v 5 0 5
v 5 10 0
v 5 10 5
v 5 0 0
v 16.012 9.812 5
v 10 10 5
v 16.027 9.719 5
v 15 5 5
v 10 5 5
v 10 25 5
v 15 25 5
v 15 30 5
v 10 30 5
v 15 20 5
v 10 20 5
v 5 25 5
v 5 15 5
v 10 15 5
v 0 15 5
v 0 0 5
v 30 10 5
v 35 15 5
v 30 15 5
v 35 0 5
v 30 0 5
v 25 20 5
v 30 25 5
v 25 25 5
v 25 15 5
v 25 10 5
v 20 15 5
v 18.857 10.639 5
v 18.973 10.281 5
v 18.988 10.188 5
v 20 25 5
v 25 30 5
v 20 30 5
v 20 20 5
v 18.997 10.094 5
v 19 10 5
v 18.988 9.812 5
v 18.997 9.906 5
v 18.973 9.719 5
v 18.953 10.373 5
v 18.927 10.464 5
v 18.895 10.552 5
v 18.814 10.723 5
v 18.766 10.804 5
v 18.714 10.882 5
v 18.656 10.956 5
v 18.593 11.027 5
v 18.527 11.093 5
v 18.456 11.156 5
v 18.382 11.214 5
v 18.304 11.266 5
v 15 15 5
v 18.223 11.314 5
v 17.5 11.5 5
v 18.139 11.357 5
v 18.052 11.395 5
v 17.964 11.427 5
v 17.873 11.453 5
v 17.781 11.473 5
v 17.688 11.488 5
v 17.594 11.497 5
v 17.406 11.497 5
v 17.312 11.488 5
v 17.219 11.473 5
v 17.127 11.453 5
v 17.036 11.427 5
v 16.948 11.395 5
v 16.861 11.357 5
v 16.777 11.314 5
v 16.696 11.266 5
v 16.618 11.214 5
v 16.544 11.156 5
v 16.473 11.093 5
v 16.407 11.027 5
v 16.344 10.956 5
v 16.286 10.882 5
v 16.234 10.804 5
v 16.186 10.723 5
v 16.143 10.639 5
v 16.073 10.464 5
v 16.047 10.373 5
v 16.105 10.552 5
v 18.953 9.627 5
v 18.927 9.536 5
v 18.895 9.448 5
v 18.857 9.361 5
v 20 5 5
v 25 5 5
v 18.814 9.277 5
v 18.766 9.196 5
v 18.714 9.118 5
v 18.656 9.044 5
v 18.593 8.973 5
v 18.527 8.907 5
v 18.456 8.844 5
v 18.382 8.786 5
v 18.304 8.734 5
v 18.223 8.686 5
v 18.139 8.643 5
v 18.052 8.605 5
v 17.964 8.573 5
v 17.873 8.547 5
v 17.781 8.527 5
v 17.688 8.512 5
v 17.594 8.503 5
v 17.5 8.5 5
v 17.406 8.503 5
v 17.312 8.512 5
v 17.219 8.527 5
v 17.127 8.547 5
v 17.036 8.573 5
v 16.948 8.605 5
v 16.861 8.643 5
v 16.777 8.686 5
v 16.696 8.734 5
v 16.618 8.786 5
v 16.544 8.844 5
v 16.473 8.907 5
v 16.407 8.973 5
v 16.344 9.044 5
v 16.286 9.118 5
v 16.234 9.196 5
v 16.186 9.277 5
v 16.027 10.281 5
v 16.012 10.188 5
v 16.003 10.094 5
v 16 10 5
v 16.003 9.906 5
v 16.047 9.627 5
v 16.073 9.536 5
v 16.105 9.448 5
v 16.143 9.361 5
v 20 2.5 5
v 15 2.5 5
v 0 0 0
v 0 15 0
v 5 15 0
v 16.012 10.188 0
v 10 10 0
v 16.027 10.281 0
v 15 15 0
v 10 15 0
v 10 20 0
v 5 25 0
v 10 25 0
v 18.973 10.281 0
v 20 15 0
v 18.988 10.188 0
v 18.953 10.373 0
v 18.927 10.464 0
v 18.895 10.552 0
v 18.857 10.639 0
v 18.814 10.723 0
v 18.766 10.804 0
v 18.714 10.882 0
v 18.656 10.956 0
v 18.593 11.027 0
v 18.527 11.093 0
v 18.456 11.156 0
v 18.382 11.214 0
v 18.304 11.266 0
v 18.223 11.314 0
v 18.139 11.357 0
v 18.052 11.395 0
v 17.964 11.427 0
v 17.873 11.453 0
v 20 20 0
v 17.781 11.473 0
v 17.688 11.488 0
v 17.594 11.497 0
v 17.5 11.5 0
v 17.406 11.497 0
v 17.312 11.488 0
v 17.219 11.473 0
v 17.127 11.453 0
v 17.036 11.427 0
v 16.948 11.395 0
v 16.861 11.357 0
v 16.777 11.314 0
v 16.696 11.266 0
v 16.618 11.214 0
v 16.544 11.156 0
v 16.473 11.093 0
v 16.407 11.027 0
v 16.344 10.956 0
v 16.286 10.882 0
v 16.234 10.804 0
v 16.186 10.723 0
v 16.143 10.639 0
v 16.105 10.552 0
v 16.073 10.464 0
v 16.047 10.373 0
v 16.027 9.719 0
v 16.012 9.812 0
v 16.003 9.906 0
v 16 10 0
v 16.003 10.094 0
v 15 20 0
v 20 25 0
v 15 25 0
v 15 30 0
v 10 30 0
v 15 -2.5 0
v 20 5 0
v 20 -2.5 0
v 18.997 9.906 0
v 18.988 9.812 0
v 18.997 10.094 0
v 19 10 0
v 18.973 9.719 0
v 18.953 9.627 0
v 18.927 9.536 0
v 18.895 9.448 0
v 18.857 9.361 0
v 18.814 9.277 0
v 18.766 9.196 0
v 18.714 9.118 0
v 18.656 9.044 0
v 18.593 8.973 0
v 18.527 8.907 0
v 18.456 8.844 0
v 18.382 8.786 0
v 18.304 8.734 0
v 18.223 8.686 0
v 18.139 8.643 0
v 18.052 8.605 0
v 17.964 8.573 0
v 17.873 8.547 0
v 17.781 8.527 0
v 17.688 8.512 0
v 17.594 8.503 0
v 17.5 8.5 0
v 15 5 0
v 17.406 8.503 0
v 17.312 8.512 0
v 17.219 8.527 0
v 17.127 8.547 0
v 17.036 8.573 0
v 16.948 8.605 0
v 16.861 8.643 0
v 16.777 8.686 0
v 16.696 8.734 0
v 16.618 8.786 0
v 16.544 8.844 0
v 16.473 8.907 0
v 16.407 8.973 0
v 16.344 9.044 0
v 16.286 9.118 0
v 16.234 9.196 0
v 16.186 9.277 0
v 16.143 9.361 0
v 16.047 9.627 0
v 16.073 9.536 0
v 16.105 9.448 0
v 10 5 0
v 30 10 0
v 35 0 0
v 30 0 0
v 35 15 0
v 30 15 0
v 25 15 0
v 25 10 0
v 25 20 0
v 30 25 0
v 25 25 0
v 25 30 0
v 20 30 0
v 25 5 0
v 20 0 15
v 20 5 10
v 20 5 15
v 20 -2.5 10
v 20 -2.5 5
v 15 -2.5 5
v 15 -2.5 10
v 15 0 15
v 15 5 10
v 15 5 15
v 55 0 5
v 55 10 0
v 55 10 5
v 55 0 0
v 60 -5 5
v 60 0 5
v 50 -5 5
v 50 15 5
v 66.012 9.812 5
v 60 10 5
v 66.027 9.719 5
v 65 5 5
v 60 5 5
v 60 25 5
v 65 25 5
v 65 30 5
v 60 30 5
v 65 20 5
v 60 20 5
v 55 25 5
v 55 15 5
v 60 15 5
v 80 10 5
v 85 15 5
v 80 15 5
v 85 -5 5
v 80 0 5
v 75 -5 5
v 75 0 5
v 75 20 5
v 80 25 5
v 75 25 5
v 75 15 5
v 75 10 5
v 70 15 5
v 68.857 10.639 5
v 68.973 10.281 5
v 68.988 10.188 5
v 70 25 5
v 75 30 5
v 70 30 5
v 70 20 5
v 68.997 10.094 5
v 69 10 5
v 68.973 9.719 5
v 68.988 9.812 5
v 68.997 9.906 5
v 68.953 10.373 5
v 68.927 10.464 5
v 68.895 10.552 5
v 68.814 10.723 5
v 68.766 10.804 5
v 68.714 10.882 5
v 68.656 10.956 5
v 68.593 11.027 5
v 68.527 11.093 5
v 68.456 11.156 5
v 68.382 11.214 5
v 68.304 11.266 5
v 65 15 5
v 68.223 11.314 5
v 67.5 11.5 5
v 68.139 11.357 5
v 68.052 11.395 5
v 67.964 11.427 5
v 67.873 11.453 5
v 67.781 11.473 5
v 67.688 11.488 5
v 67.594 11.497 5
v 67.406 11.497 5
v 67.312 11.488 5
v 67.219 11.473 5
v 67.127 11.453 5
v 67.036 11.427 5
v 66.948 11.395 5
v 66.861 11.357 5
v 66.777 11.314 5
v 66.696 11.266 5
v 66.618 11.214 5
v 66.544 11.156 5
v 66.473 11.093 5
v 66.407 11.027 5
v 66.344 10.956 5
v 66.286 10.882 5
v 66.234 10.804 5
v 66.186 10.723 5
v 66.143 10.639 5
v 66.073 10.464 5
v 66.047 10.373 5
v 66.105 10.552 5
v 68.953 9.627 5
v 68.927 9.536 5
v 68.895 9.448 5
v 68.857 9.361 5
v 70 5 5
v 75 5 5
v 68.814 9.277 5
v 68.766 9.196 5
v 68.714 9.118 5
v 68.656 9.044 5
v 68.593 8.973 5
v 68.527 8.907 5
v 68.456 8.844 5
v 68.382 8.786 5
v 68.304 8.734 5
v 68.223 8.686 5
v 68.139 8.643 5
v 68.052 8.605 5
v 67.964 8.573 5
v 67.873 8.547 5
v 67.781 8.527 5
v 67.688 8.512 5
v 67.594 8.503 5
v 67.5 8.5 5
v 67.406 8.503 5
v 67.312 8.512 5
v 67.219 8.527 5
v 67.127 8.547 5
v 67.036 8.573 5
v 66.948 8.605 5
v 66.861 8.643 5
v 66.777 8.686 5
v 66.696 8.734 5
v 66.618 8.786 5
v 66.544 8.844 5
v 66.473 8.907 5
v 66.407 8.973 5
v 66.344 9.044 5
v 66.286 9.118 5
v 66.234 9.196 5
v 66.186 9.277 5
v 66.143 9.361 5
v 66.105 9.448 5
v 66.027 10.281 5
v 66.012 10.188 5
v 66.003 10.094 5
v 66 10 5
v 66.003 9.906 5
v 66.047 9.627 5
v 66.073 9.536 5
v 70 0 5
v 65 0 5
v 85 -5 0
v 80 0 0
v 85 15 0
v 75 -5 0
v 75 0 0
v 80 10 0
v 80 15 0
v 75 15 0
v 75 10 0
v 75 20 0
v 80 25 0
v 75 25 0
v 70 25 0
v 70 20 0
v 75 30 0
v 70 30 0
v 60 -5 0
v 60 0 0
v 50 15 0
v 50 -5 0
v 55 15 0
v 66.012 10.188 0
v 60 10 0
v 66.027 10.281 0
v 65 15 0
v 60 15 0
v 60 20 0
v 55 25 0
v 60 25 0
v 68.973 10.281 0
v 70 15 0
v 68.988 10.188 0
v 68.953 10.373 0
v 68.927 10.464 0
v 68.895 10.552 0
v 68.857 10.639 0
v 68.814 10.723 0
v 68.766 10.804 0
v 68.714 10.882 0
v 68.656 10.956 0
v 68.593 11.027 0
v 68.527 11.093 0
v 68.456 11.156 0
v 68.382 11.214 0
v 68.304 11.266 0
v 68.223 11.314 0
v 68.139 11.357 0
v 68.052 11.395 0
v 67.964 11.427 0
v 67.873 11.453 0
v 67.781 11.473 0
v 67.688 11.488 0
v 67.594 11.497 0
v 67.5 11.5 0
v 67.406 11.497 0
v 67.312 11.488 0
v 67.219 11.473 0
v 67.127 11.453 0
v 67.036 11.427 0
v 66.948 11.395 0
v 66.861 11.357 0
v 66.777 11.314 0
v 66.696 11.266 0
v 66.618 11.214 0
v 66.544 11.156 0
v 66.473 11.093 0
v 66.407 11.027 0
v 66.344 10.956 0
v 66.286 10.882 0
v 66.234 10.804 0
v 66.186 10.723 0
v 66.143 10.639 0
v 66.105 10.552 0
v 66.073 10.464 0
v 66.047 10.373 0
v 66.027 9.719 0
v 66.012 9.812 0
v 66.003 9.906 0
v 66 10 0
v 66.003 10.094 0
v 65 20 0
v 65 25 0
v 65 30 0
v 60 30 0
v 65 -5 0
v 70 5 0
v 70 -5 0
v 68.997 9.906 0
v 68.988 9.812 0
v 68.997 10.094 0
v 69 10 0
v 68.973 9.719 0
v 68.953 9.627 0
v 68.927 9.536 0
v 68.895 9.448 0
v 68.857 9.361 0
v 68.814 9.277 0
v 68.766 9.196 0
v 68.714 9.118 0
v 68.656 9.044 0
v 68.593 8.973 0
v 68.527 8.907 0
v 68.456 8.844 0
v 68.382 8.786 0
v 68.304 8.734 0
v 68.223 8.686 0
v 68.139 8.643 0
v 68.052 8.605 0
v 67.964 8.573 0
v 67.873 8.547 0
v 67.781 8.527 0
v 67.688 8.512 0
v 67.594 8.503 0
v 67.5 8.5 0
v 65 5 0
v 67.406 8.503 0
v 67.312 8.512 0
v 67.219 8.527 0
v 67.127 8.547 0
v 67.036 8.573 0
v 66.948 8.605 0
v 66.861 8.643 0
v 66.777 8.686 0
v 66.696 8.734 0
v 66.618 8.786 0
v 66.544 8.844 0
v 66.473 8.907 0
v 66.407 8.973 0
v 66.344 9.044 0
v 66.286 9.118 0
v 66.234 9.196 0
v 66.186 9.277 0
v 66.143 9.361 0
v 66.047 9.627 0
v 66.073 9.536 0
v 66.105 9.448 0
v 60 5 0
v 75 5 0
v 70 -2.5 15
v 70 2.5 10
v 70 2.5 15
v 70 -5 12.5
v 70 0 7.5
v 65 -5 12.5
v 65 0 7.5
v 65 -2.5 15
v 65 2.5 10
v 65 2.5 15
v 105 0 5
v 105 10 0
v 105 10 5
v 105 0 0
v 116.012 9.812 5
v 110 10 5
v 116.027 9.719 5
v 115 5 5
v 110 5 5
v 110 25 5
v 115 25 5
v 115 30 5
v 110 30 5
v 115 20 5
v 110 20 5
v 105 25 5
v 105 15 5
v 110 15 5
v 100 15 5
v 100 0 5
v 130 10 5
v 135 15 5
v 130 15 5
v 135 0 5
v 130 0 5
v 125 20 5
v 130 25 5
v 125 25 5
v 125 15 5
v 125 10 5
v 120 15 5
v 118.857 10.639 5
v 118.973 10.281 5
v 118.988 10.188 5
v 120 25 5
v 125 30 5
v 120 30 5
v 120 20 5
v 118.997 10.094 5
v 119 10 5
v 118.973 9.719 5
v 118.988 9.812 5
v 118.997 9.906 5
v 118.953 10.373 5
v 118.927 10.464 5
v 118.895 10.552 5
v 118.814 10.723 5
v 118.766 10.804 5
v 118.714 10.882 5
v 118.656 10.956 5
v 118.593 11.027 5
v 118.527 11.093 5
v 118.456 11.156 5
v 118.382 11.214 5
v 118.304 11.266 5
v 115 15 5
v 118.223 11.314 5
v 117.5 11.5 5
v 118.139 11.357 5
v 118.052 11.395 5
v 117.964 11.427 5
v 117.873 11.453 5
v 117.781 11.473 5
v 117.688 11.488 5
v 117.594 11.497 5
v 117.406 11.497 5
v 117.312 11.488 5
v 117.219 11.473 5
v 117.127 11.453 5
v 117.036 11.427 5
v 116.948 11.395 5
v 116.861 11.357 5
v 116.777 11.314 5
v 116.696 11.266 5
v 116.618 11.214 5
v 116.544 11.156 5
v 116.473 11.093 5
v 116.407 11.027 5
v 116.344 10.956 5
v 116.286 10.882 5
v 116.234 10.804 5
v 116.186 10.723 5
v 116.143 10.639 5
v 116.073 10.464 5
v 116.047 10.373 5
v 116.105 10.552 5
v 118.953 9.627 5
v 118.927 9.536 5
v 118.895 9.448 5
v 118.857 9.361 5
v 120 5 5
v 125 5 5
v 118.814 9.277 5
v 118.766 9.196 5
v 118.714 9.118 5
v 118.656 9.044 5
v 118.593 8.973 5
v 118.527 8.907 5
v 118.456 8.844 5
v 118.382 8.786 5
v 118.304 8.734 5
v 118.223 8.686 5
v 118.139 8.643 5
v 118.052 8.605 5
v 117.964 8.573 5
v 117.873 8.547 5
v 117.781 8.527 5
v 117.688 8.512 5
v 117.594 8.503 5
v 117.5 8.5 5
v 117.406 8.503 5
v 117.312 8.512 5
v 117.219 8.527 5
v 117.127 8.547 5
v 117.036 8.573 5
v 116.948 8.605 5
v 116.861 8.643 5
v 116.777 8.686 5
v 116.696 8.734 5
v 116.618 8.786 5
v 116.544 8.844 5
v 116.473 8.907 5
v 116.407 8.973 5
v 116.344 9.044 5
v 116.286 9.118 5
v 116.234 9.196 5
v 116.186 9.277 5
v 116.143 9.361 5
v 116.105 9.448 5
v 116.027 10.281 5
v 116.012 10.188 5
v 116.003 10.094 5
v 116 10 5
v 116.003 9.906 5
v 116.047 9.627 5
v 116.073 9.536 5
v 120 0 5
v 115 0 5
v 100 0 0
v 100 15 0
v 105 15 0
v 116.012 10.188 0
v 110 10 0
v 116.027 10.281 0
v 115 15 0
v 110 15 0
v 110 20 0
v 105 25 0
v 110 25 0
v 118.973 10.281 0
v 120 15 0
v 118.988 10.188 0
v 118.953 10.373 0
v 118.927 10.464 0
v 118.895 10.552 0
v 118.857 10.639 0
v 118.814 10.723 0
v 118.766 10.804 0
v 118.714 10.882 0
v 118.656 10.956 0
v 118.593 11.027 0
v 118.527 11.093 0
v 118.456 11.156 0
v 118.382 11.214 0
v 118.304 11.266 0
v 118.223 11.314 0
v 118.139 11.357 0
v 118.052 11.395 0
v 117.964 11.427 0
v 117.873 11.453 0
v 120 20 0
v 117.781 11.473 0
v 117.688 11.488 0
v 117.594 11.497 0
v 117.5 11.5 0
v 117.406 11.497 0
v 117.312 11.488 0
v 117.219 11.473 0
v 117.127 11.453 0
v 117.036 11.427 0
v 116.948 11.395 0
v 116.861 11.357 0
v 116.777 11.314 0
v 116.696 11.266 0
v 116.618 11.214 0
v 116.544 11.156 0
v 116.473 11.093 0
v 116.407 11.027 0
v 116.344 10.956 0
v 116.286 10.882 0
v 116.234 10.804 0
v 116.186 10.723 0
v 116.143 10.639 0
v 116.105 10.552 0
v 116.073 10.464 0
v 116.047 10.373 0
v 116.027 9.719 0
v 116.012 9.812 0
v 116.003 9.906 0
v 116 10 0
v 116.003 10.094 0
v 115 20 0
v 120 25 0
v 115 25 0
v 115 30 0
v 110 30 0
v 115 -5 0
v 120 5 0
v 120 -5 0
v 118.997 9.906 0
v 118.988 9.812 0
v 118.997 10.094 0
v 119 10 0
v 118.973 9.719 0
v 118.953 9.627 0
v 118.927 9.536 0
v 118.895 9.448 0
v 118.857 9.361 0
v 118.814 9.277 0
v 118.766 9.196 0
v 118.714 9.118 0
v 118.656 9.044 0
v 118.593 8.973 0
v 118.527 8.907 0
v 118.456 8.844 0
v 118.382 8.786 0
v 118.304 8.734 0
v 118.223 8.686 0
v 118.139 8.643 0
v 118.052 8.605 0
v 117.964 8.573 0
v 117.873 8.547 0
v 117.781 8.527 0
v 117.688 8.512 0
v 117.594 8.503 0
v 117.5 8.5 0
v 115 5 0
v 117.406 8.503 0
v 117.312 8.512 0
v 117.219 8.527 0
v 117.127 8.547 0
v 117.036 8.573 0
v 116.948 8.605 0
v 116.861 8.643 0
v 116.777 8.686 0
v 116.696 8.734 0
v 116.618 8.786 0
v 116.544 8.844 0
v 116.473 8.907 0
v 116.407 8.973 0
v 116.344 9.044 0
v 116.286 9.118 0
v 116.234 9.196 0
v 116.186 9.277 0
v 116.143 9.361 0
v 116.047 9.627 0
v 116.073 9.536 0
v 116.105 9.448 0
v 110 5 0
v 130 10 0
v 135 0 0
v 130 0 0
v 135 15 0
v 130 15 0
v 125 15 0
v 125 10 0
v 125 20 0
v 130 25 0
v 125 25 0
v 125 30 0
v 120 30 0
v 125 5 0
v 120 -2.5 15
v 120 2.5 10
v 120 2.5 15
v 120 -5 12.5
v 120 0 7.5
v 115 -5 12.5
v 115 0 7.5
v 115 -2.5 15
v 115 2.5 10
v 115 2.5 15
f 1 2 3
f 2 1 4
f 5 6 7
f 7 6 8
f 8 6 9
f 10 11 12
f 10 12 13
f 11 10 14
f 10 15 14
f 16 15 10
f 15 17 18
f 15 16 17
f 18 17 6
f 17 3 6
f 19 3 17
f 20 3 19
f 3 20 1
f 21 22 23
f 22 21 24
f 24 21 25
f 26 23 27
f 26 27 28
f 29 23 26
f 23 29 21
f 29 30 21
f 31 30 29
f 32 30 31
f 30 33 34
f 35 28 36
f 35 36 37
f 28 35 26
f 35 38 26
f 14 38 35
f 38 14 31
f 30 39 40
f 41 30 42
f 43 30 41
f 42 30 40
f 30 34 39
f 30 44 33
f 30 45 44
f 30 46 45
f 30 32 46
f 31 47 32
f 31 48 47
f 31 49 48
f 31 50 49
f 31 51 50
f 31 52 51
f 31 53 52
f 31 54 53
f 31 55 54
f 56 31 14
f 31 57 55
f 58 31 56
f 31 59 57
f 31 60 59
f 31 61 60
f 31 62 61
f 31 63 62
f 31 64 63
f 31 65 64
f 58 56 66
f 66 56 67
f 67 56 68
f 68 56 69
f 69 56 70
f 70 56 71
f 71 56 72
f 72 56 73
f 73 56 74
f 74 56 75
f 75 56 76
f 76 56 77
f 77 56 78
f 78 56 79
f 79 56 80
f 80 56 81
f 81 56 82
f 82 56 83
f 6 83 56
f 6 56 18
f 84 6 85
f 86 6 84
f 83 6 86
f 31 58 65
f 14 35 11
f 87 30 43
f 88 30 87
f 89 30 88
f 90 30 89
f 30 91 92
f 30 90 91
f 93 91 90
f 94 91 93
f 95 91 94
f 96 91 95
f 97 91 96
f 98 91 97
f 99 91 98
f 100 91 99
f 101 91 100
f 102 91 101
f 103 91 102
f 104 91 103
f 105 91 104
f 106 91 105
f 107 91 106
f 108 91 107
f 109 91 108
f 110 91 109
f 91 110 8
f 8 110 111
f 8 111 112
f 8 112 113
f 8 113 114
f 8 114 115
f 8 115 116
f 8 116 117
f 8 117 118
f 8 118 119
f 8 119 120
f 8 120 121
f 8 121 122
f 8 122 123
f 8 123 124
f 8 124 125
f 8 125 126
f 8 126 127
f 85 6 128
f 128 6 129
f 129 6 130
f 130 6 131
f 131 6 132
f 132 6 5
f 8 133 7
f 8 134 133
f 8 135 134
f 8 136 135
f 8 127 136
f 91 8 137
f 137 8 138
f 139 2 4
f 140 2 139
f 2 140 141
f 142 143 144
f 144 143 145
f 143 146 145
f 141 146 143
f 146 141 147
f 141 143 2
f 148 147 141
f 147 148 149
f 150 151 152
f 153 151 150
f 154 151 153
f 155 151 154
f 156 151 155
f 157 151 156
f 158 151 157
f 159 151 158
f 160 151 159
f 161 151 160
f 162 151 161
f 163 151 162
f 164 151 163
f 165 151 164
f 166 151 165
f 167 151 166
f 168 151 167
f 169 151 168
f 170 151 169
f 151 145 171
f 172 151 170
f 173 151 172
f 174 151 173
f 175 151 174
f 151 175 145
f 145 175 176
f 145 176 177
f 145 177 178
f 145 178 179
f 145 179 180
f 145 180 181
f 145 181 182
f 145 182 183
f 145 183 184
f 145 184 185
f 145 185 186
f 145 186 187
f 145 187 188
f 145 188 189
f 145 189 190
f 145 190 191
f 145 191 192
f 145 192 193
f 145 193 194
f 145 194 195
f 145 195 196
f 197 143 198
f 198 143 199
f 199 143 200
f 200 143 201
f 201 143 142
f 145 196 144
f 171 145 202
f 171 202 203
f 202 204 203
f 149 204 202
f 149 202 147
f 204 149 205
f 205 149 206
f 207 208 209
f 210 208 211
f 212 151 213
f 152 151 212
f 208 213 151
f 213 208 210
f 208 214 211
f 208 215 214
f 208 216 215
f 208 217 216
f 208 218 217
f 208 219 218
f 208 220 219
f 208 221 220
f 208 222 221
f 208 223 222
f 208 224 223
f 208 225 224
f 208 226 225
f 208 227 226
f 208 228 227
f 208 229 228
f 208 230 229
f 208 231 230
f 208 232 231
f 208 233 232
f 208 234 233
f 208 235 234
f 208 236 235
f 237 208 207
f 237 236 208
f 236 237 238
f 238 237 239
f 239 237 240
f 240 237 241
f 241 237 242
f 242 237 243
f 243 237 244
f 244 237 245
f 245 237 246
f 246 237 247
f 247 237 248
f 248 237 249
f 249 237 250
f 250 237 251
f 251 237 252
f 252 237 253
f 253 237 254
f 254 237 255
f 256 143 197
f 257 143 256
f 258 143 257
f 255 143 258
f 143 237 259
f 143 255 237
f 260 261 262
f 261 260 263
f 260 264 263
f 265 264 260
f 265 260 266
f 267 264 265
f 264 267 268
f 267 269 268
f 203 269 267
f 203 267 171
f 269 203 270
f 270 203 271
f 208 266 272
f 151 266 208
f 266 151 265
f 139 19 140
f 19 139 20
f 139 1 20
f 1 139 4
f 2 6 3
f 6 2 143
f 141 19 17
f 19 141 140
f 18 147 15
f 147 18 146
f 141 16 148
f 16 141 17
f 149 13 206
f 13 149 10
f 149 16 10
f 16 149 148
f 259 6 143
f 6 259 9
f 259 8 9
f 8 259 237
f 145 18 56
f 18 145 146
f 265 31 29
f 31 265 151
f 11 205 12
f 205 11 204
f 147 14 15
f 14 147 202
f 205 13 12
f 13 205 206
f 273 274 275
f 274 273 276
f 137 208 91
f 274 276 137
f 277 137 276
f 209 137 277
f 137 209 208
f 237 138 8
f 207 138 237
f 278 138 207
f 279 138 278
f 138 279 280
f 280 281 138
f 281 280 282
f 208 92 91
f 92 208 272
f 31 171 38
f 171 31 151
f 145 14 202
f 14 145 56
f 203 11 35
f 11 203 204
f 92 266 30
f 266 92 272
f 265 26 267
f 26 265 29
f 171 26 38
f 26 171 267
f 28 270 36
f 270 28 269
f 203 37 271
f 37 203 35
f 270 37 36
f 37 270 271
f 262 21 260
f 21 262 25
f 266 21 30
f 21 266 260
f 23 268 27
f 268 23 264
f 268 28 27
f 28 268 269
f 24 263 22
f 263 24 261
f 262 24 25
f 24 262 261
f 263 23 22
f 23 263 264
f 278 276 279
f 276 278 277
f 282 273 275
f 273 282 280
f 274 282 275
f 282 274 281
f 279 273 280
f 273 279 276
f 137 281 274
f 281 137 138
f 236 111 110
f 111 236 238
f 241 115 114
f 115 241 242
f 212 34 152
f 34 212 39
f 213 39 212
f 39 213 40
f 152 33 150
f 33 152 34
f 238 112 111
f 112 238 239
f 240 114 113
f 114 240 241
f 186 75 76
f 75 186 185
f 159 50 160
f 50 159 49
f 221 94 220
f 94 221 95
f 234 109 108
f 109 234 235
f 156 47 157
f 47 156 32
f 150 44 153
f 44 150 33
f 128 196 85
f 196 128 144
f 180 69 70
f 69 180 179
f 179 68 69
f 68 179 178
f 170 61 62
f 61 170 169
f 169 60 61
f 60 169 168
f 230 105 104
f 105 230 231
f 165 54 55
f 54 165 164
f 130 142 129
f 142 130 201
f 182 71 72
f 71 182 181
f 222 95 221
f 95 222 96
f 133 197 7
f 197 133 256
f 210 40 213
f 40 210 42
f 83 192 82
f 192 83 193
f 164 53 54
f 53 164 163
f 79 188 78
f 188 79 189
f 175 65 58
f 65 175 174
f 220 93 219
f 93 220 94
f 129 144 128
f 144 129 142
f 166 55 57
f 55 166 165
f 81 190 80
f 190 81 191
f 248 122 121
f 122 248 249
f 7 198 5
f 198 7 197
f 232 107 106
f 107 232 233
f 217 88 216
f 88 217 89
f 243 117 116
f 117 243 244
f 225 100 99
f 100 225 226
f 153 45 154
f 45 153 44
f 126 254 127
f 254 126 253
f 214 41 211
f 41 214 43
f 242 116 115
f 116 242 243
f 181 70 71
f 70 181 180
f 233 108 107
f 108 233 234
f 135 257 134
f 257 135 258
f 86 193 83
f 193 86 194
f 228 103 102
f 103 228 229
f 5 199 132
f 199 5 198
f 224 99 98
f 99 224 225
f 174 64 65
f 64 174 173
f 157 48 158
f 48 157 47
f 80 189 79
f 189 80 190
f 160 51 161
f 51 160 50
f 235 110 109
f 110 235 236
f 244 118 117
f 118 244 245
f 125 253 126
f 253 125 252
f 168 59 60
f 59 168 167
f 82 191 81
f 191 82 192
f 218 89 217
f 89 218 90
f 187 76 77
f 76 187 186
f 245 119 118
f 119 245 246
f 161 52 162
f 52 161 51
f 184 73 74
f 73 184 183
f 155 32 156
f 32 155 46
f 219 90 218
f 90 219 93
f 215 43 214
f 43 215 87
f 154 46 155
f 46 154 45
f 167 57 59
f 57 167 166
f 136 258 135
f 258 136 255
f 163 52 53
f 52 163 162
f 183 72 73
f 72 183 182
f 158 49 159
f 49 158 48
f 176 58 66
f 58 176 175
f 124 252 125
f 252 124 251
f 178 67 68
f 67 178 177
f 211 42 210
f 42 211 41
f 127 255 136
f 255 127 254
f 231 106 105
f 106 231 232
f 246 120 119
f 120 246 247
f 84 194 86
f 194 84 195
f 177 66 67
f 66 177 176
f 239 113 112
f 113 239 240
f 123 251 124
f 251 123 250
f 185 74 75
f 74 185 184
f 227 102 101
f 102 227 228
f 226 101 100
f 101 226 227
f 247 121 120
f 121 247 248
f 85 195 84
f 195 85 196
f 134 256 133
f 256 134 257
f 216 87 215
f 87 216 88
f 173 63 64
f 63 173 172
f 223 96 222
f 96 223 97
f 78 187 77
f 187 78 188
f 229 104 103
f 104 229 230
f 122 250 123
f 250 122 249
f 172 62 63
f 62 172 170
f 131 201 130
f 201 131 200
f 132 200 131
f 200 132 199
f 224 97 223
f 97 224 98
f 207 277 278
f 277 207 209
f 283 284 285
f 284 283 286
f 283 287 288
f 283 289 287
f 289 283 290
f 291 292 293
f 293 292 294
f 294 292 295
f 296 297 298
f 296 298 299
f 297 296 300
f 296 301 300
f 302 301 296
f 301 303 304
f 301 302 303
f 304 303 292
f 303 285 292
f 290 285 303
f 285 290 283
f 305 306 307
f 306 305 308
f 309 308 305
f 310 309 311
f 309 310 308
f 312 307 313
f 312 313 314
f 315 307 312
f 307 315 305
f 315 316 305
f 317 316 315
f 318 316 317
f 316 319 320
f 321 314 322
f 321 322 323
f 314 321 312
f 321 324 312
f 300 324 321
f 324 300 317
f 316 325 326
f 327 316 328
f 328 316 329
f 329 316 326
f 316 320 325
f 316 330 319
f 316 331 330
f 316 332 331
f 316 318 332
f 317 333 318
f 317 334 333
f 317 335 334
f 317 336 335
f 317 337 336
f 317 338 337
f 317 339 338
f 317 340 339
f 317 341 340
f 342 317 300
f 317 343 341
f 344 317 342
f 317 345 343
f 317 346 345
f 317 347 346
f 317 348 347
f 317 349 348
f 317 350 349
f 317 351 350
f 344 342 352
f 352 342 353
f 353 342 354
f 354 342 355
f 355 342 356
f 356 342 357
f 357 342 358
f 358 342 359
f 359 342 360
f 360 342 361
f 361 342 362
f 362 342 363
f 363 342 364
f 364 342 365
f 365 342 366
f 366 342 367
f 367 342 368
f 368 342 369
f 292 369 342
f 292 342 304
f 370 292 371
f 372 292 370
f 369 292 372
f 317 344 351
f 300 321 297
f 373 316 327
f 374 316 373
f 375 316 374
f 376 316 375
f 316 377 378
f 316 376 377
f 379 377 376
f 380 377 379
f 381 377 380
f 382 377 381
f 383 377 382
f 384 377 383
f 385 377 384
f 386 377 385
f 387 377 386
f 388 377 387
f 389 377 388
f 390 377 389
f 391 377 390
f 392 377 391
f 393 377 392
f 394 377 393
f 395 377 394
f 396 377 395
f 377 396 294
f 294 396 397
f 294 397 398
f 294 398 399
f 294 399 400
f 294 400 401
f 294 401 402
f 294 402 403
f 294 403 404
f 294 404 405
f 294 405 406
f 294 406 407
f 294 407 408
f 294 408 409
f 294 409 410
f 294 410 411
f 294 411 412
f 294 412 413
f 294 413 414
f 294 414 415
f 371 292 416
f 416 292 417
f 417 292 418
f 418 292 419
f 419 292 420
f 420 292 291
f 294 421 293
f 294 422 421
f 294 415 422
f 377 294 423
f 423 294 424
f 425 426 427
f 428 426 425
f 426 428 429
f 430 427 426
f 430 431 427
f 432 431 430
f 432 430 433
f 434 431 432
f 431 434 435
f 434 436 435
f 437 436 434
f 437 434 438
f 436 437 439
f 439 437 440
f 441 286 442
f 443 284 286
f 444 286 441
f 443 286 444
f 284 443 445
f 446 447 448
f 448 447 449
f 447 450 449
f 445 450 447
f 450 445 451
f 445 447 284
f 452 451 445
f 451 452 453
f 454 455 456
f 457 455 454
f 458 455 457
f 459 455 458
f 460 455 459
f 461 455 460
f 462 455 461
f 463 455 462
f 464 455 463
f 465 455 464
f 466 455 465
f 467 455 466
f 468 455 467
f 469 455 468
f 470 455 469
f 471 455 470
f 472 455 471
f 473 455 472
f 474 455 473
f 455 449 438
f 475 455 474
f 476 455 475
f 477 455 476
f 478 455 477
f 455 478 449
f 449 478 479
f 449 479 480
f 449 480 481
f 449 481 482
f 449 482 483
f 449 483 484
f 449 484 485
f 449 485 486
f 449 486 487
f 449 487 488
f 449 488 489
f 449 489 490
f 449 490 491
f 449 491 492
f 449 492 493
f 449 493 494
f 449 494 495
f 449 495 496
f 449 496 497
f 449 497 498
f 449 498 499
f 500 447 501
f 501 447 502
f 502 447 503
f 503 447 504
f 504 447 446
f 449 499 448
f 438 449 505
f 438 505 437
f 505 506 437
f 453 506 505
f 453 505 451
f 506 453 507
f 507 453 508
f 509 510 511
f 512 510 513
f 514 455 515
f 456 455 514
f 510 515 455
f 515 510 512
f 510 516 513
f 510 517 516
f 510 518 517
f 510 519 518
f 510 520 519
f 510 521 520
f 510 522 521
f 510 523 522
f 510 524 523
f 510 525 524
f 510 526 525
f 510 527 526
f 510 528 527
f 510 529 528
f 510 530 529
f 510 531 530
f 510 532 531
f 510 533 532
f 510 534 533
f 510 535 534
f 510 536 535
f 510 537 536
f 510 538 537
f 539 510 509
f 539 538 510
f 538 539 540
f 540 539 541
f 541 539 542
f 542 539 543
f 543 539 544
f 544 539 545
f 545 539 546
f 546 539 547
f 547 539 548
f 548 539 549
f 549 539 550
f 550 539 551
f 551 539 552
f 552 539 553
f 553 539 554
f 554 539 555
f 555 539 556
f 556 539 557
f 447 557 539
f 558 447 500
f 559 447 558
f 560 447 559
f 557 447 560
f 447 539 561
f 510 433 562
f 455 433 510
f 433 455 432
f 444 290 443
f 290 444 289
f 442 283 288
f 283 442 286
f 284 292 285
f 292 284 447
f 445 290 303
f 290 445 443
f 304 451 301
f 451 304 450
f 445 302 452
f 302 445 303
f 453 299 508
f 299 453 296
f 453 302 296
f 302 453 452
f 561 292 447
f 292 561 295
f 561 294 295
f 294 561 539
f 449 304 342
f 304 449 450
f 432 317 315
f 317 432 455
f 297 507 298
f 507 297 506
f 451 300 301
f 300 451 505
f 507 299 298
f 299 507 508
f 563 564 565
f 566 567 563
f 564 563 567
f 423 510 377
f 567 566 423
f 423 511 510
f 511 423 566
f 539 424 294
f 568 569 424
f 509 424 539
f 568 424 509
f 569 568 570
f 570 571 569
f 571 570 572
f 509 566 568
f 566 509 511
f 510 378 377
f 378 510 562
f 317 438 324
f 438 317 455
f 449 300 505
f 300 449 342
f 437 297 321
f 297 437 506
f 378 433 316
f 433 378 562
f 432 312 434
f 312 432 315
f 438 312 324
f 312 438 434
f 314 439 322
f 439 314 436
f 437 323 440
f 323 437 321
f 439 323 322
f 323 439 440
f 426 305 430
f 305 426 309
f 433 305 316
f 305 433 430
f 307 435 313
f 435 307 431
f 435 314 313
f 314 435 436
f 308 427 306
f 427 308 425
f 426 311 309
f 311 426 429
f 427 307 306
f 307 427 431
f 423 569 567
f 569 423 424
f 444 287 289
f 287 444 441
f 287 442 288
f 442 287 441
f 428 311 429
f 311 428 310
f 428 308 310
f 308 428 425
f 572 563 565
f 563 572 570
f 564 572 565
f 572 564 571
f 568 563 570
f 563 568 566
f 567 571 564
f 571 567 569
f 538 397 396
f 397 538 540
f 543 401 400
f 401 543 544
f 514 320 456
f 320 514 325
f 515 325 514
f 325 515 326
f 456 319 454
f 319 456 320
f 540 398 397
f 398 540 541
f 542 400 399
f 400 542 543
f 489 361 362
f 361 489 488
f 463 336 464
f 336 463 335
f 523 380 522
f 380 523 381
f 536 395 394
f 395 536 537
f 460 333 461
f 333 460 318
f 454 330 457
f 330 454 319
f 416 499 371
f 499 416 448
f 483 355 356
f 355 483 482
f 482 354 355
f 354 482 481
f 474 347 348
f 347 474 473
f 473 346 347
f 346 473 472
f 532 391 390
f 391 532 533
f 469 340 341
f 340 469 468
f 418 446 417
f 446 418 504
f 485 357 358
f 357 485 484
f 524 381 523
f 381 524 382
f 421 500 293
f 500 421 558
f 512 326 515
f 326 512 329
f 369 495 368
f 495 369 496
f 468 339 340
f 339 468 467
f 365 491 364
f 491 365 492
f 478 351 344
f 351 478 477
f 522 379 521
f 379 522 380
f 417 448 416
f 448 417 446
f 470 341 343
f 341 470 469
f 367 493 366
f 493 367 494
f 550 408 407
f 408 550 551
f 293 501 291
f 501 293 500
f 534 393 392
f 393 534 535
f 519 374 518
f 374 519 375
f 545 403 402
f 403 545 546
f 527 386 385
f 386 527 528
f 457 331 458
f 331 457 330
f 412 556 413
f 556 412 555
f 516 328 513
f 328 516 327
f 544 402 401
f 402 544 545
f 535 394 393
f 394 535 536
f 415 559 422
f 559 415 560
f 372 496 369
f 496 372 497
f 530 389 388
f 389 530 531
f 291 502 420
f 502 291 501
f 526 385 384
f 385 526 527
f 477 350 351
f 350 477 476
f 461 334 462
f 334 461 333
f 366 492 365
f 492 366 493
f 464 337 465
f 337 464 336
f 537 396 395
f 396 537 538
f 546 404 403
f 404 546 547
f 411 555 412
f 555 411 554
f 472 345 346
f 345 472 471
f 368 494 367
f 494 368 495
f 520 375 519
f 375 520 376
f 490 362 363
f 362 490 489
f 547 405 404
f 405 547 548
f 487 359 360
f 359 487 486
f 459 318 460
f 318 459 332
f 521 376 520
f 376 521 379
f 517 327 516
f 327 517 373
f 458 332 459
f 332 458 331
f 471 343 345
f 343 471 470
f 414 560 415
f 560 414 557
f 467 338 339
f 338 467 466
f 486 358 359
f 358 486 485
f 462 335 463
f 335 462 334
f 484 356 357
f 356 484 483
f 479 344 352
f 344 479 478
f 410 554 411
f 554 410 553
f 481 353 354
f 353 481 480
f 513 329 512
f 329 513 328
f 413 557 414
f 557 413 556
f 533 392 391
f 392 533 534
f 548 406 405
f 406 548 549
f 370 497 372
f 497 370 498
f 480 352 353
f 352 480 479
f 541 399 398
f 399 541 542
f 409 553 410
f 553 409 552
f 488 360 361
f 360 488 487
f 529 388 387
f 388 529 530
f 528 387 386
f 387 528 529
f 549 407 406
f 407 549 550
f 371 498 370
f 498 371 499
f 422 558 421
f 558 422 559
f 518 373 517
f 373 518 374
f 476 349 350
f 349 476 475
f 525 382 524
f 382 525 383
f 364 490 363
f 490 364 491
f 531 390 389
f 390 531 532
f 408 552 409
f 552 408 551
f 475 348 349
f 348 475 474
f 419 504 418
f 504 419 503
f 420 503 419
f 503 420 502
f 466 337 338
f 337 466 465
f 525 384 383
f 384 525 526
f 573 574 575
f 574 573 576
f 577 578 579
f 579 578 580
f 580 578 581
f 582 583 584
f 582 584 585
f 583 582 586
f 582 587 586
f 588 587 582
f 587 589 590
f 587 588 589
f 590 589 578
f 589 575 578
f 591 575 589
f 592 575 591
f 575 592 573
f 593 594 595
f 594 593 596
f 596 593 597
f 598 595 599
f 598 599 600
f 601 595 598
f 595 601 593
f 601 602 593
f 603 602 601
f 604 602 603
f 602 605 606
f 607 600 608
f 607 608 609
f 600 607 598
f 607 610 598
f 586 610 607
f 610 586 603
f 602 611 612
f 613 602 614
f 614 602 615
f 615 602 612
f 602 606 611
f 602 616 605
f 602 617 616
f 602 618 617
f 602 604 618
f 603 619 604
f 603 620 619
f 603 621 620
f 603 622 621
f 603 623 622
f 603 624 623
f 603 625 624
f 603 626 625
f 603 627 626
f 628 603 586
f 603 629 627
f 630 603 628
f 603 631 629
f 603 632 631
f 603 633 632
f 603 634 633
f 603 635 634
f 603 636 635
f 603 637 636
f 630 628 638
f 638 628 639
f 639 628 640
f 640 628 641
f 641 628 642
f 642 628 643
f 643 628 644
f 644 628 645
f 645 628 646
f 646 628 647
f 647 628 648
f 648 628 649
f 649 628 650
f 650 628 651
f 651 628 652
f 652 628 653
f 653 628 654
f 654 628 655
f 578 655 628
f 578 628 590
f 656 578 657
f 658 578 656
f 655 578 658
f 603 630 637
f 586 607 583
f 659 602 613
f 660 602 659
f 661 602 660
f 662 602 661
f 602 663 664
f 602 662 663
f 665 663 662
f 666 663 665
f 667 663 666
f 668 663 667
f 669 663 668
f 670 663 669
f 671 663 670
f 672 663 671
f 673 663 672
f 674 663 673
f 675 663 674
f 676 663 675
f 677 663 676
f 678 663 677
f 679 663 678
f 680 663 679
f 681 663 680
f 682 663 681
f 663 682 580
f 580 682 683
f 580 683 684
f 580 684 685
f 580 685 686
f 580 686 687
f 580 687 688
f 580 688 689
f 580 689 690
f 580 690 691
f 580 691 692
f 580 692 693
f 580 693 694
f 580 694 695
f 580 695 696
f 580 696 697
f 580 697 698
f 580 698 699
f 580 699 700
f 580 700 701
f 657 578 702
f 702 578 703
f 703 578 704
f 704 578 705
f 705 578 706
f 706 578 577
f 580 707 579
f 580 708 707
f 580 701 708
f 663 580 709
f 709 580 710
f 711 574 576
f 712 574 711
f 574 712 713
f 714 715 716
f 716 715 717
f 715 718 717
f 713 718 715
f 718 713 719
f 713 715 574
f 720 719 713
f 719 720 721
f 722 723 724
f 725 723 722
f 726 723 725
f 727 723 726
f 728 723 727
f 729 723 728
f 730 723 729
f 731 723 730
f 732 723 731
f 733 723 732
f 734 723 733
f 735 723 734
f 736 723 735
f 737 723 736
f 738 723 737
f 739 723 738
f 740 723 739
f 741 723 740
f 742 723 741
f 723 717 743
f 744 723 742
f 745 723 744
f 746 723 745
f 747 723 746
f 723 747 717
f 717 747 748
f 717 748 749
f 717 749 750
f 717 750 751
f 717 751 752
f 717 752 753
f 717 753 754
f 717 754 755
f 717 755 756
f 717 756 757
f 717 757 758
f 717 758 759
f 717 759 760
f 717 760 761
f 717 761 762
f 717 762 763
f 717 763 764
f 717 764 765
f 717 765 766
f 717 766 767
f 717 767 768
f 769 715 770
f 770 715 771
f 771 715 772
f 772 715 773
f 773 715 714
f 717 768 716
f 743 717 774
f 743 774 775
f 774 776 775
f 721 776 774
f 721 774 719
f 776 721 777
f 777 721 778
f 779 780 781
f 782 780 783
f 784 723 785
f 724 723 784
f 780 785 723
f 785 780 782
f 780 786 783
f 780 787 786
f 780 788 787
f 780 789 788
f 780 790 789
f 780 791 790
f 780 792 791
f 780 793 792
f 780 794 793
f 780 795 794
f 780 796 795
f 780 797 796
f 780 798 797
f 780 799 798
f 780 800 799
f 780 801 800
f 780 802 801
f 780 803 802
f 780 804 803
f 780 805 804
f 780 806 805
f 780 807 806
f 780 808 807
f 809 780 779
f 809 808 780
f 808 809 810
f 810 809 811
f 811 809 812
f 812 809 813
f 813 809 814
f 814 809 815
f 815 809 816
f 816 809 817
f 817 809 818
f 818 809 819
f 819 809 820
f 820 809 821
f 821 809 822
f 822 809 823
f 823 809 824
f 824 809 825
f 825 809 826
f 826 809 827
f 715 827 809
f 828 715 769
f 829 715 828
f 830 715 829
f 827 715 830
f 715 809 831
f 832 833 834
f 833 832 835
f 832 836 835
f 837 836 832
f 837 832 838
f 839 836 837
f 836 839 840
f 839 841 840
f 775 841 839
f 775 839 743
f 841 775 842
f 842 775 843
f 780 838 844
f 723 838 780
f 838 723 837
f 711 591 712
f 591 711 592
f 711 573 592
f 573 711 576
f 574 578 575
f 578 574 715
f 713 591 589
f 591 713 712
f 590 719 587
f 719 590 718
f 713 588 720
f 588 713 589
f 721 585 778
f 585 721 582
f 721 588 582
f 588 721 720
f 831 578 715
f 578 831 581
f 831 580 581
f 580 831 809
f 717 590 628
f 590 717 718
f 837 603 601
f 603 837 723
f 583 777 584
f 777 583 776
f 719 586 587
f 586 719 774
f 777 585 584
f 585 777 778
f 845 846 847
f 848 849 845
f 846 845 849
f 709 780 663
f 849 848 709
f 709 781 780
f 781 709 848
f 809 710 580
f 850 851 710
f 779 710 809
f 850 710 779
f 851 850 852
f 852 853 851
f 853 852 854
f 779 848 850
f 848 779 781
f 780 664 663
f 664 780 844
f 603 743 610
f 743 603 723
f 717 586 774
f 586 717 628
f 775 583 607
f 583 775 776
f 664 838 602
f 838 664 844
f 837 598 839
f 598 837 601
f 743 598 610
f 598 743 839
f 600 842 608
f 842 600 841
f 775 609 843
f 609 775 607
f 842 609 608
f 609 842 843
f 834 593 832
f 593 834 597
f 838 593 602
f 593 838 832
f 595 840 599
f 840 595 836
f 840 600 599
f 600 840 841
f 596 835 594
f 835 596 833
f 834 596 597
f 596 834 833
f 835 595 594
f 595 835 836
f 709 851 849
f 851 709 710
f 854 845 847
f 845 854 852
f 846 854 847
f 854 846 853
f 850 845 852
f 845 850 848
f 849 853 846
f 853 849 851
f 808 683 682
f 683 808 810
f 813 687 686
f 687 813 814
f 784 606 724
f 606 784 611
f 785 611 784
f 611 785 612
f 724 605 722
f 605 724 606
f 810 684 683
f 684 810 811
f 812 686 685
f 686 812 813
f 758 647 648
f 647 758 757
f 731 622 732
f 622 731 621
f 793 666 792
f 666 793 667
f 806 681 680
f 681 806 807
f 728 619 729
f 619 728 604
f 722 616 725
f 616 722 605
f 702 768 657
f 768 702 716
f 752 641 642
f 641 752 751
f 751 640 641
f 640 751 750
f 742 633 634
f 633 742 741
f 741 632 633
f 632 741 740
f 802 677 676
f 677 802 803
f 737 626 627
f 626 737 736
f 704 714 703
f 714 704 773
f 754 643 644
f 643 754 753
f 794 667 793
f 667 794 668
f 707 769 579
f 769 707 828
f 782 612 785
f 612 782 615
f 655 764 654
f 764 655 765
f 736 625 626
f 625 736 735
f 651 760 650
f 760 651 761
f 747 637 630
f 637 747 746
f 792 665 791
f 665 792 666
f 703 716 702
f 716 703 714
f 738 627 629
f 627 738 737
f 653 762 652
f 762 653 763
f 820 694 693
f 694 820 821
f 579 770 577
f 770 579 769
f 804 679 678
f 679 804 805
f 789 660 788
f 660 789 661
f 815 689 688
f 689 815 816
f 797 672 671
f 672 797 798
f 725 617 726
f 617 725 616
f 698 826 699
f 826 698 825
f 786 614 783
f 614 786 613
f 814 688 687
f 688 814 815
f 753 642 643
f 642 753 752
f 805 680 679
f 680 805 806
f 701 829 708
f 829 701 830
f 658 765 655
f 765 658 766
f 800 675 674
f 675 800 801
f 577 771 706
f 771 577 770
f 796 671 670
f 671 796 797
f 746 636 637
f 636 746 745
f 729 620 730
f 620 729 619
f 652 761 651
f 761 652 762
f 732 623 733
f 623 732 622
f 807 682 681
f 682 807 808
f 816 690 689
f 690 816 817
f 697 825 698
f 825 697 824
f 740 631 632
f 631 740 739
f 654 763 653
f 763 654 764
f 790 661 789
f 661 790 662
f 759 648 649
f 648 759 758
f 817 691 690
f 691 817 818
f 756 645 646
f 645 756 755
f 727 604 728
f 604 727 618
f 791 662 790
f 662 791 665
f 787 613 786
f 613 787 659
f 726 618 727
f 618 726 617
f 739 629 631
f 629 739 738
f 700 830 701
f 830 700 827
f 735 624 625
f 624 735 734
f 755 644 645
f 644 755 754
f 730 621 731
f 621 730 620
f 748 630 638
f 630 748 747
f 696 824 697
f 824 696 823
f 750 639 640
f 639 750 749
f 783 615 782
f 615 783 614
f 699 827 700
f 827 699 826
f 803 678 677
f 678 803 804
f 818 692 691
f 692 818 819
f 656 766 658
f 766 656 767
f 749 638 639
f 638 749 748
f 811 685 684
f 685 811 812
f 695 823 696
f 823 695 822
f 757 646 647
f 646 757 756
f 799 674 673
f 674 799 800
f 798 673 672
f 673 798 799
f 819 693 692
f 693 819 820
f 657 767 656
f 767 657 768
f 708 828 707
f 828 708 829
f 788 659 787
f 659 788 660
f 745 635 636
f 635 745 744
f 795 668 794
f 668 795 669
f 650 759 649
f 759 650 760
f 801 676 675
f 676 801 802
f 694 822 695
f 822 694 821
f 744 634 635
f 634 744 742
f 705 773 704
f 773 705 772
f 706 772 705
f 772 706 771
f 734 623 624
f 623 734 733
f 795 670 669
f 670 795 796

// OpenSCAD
// properties

$fn=100;

edgeLength=5;


// programm

translate([0, 0, 0]) holder2();
translate([50, 0, 0]) holder3();
translate([100, 0, 0]) holder4();



// modules

module holder3() {
	difference() {
		union() {
			invader2();
			translate([0, 0, 0.5*edgeLength]) {
				_cube(3, -1);
			}
			_cube(0, -1);
			_cube(1, -1);
			_cube(5, -1);
			_cube(6, -1);
			hull() {
				translate([0, 0, 1.5*edgeLength]) {
					_cube(3,-1);
				}
				translate([0, 0.5*edgeLength, 2*edgeLength]) {
					_cube(3,-1);
				}
			}
		}
		translate([3.5*edgeLength, 2*edgeLength, 0]) {
			cylinder(h=edgeLength, r=1.5);
		}
	}
}

module holder4() {
	difference() {
		union() {
			invader2();
			translate([0, 0, 0.5*edgeLength]) {
				_cube(3, -1);
			}
			hull() {
				translate([0, 0, 1.5*edgeLength]) {
					_cube(3,-1);
				}
				translate([0, 0.5*edgeLength, 2*edgeLength]) {
					_cube(3,-1);
				}
			}
		}
		translate([3.5*edgeLength, 2*edgeLength, 0]) {
			cylinder(h=edgeLength, r=1.5);
		}
	}
}

module holder2() {
	difference() {
		union() {
			invader2();
			hull() {
				translate([0, 0, 1*edgeLength]) {
					_cube(3,-0.5);
				}
				translate([0, 0.5*edgeLength, 2*edgeLength]) {
					_cube(3,-0.5);
				}
			}
		}
		translate([3.5*edgeLength, 2*edgeLength, 0]) {
			cylinder(h=edgeLength, r=1.5);
		}
		translate([0, -1.5*edgeLength, 0]) cube([50, edgeLength, edgeLength]);
	}
}

module _cube(x, y) {
	translate([x*edgeLength, y*edgeLength, 0]) {
		cube([edgeLength, edgeLength, edgeLength]);
	}
}



module invader1() {
	union() {
		_cube(0, 0);
		_cube(0, 1);
		_cube(0, 2);
		_cube(1, 2);
		_cube(1, 3);
		_cube(1, 4);
		_cube(2, 1);
		_cube(2, 2);
		_cube(2, 4);
		_cube(2, 5);
		_cube(3, 2);
		_cube(3, 3);
		_cube(3, 4);
		_cube(4, 1);
		_cube(4, 2);
		_cube(4, 4);
		_cube(4, 5);
		_cube(5, 2);
		_cube(5, 3);
		_cube(5, 4);
		_cube(6, 0);
		_cube(6, 1);
		_cube(6, 2);
	}	
}

module invader2() {
	union() {
		_cube(0, 0);
		_cube(0, 1);
		_cube(0, 2);
		_cube(1, 2);
		_cube(1, 3);
		_cube(1, 4);
		_cube(2, 1);
		_cube(2, 2);
		_cube(2, 4);
		_cube(2, 5);
		_cube(3, -1);
		_cube(3, 0);
		_cube(3, 1);
		_cube(3, 2);
		_cube(3, 3);
		_cube(3, 4);
		_cube(4, 1);
		_cube(4, 2);
		_cube(4, 4);
		_cube(4, 5);
		_cube(5, 2);
		_cube(5, 3);
		_cube(5, 4);
		_cube(6, 0);
		_cube(6, 1);
		_cube(6, 2);
	}	
}
